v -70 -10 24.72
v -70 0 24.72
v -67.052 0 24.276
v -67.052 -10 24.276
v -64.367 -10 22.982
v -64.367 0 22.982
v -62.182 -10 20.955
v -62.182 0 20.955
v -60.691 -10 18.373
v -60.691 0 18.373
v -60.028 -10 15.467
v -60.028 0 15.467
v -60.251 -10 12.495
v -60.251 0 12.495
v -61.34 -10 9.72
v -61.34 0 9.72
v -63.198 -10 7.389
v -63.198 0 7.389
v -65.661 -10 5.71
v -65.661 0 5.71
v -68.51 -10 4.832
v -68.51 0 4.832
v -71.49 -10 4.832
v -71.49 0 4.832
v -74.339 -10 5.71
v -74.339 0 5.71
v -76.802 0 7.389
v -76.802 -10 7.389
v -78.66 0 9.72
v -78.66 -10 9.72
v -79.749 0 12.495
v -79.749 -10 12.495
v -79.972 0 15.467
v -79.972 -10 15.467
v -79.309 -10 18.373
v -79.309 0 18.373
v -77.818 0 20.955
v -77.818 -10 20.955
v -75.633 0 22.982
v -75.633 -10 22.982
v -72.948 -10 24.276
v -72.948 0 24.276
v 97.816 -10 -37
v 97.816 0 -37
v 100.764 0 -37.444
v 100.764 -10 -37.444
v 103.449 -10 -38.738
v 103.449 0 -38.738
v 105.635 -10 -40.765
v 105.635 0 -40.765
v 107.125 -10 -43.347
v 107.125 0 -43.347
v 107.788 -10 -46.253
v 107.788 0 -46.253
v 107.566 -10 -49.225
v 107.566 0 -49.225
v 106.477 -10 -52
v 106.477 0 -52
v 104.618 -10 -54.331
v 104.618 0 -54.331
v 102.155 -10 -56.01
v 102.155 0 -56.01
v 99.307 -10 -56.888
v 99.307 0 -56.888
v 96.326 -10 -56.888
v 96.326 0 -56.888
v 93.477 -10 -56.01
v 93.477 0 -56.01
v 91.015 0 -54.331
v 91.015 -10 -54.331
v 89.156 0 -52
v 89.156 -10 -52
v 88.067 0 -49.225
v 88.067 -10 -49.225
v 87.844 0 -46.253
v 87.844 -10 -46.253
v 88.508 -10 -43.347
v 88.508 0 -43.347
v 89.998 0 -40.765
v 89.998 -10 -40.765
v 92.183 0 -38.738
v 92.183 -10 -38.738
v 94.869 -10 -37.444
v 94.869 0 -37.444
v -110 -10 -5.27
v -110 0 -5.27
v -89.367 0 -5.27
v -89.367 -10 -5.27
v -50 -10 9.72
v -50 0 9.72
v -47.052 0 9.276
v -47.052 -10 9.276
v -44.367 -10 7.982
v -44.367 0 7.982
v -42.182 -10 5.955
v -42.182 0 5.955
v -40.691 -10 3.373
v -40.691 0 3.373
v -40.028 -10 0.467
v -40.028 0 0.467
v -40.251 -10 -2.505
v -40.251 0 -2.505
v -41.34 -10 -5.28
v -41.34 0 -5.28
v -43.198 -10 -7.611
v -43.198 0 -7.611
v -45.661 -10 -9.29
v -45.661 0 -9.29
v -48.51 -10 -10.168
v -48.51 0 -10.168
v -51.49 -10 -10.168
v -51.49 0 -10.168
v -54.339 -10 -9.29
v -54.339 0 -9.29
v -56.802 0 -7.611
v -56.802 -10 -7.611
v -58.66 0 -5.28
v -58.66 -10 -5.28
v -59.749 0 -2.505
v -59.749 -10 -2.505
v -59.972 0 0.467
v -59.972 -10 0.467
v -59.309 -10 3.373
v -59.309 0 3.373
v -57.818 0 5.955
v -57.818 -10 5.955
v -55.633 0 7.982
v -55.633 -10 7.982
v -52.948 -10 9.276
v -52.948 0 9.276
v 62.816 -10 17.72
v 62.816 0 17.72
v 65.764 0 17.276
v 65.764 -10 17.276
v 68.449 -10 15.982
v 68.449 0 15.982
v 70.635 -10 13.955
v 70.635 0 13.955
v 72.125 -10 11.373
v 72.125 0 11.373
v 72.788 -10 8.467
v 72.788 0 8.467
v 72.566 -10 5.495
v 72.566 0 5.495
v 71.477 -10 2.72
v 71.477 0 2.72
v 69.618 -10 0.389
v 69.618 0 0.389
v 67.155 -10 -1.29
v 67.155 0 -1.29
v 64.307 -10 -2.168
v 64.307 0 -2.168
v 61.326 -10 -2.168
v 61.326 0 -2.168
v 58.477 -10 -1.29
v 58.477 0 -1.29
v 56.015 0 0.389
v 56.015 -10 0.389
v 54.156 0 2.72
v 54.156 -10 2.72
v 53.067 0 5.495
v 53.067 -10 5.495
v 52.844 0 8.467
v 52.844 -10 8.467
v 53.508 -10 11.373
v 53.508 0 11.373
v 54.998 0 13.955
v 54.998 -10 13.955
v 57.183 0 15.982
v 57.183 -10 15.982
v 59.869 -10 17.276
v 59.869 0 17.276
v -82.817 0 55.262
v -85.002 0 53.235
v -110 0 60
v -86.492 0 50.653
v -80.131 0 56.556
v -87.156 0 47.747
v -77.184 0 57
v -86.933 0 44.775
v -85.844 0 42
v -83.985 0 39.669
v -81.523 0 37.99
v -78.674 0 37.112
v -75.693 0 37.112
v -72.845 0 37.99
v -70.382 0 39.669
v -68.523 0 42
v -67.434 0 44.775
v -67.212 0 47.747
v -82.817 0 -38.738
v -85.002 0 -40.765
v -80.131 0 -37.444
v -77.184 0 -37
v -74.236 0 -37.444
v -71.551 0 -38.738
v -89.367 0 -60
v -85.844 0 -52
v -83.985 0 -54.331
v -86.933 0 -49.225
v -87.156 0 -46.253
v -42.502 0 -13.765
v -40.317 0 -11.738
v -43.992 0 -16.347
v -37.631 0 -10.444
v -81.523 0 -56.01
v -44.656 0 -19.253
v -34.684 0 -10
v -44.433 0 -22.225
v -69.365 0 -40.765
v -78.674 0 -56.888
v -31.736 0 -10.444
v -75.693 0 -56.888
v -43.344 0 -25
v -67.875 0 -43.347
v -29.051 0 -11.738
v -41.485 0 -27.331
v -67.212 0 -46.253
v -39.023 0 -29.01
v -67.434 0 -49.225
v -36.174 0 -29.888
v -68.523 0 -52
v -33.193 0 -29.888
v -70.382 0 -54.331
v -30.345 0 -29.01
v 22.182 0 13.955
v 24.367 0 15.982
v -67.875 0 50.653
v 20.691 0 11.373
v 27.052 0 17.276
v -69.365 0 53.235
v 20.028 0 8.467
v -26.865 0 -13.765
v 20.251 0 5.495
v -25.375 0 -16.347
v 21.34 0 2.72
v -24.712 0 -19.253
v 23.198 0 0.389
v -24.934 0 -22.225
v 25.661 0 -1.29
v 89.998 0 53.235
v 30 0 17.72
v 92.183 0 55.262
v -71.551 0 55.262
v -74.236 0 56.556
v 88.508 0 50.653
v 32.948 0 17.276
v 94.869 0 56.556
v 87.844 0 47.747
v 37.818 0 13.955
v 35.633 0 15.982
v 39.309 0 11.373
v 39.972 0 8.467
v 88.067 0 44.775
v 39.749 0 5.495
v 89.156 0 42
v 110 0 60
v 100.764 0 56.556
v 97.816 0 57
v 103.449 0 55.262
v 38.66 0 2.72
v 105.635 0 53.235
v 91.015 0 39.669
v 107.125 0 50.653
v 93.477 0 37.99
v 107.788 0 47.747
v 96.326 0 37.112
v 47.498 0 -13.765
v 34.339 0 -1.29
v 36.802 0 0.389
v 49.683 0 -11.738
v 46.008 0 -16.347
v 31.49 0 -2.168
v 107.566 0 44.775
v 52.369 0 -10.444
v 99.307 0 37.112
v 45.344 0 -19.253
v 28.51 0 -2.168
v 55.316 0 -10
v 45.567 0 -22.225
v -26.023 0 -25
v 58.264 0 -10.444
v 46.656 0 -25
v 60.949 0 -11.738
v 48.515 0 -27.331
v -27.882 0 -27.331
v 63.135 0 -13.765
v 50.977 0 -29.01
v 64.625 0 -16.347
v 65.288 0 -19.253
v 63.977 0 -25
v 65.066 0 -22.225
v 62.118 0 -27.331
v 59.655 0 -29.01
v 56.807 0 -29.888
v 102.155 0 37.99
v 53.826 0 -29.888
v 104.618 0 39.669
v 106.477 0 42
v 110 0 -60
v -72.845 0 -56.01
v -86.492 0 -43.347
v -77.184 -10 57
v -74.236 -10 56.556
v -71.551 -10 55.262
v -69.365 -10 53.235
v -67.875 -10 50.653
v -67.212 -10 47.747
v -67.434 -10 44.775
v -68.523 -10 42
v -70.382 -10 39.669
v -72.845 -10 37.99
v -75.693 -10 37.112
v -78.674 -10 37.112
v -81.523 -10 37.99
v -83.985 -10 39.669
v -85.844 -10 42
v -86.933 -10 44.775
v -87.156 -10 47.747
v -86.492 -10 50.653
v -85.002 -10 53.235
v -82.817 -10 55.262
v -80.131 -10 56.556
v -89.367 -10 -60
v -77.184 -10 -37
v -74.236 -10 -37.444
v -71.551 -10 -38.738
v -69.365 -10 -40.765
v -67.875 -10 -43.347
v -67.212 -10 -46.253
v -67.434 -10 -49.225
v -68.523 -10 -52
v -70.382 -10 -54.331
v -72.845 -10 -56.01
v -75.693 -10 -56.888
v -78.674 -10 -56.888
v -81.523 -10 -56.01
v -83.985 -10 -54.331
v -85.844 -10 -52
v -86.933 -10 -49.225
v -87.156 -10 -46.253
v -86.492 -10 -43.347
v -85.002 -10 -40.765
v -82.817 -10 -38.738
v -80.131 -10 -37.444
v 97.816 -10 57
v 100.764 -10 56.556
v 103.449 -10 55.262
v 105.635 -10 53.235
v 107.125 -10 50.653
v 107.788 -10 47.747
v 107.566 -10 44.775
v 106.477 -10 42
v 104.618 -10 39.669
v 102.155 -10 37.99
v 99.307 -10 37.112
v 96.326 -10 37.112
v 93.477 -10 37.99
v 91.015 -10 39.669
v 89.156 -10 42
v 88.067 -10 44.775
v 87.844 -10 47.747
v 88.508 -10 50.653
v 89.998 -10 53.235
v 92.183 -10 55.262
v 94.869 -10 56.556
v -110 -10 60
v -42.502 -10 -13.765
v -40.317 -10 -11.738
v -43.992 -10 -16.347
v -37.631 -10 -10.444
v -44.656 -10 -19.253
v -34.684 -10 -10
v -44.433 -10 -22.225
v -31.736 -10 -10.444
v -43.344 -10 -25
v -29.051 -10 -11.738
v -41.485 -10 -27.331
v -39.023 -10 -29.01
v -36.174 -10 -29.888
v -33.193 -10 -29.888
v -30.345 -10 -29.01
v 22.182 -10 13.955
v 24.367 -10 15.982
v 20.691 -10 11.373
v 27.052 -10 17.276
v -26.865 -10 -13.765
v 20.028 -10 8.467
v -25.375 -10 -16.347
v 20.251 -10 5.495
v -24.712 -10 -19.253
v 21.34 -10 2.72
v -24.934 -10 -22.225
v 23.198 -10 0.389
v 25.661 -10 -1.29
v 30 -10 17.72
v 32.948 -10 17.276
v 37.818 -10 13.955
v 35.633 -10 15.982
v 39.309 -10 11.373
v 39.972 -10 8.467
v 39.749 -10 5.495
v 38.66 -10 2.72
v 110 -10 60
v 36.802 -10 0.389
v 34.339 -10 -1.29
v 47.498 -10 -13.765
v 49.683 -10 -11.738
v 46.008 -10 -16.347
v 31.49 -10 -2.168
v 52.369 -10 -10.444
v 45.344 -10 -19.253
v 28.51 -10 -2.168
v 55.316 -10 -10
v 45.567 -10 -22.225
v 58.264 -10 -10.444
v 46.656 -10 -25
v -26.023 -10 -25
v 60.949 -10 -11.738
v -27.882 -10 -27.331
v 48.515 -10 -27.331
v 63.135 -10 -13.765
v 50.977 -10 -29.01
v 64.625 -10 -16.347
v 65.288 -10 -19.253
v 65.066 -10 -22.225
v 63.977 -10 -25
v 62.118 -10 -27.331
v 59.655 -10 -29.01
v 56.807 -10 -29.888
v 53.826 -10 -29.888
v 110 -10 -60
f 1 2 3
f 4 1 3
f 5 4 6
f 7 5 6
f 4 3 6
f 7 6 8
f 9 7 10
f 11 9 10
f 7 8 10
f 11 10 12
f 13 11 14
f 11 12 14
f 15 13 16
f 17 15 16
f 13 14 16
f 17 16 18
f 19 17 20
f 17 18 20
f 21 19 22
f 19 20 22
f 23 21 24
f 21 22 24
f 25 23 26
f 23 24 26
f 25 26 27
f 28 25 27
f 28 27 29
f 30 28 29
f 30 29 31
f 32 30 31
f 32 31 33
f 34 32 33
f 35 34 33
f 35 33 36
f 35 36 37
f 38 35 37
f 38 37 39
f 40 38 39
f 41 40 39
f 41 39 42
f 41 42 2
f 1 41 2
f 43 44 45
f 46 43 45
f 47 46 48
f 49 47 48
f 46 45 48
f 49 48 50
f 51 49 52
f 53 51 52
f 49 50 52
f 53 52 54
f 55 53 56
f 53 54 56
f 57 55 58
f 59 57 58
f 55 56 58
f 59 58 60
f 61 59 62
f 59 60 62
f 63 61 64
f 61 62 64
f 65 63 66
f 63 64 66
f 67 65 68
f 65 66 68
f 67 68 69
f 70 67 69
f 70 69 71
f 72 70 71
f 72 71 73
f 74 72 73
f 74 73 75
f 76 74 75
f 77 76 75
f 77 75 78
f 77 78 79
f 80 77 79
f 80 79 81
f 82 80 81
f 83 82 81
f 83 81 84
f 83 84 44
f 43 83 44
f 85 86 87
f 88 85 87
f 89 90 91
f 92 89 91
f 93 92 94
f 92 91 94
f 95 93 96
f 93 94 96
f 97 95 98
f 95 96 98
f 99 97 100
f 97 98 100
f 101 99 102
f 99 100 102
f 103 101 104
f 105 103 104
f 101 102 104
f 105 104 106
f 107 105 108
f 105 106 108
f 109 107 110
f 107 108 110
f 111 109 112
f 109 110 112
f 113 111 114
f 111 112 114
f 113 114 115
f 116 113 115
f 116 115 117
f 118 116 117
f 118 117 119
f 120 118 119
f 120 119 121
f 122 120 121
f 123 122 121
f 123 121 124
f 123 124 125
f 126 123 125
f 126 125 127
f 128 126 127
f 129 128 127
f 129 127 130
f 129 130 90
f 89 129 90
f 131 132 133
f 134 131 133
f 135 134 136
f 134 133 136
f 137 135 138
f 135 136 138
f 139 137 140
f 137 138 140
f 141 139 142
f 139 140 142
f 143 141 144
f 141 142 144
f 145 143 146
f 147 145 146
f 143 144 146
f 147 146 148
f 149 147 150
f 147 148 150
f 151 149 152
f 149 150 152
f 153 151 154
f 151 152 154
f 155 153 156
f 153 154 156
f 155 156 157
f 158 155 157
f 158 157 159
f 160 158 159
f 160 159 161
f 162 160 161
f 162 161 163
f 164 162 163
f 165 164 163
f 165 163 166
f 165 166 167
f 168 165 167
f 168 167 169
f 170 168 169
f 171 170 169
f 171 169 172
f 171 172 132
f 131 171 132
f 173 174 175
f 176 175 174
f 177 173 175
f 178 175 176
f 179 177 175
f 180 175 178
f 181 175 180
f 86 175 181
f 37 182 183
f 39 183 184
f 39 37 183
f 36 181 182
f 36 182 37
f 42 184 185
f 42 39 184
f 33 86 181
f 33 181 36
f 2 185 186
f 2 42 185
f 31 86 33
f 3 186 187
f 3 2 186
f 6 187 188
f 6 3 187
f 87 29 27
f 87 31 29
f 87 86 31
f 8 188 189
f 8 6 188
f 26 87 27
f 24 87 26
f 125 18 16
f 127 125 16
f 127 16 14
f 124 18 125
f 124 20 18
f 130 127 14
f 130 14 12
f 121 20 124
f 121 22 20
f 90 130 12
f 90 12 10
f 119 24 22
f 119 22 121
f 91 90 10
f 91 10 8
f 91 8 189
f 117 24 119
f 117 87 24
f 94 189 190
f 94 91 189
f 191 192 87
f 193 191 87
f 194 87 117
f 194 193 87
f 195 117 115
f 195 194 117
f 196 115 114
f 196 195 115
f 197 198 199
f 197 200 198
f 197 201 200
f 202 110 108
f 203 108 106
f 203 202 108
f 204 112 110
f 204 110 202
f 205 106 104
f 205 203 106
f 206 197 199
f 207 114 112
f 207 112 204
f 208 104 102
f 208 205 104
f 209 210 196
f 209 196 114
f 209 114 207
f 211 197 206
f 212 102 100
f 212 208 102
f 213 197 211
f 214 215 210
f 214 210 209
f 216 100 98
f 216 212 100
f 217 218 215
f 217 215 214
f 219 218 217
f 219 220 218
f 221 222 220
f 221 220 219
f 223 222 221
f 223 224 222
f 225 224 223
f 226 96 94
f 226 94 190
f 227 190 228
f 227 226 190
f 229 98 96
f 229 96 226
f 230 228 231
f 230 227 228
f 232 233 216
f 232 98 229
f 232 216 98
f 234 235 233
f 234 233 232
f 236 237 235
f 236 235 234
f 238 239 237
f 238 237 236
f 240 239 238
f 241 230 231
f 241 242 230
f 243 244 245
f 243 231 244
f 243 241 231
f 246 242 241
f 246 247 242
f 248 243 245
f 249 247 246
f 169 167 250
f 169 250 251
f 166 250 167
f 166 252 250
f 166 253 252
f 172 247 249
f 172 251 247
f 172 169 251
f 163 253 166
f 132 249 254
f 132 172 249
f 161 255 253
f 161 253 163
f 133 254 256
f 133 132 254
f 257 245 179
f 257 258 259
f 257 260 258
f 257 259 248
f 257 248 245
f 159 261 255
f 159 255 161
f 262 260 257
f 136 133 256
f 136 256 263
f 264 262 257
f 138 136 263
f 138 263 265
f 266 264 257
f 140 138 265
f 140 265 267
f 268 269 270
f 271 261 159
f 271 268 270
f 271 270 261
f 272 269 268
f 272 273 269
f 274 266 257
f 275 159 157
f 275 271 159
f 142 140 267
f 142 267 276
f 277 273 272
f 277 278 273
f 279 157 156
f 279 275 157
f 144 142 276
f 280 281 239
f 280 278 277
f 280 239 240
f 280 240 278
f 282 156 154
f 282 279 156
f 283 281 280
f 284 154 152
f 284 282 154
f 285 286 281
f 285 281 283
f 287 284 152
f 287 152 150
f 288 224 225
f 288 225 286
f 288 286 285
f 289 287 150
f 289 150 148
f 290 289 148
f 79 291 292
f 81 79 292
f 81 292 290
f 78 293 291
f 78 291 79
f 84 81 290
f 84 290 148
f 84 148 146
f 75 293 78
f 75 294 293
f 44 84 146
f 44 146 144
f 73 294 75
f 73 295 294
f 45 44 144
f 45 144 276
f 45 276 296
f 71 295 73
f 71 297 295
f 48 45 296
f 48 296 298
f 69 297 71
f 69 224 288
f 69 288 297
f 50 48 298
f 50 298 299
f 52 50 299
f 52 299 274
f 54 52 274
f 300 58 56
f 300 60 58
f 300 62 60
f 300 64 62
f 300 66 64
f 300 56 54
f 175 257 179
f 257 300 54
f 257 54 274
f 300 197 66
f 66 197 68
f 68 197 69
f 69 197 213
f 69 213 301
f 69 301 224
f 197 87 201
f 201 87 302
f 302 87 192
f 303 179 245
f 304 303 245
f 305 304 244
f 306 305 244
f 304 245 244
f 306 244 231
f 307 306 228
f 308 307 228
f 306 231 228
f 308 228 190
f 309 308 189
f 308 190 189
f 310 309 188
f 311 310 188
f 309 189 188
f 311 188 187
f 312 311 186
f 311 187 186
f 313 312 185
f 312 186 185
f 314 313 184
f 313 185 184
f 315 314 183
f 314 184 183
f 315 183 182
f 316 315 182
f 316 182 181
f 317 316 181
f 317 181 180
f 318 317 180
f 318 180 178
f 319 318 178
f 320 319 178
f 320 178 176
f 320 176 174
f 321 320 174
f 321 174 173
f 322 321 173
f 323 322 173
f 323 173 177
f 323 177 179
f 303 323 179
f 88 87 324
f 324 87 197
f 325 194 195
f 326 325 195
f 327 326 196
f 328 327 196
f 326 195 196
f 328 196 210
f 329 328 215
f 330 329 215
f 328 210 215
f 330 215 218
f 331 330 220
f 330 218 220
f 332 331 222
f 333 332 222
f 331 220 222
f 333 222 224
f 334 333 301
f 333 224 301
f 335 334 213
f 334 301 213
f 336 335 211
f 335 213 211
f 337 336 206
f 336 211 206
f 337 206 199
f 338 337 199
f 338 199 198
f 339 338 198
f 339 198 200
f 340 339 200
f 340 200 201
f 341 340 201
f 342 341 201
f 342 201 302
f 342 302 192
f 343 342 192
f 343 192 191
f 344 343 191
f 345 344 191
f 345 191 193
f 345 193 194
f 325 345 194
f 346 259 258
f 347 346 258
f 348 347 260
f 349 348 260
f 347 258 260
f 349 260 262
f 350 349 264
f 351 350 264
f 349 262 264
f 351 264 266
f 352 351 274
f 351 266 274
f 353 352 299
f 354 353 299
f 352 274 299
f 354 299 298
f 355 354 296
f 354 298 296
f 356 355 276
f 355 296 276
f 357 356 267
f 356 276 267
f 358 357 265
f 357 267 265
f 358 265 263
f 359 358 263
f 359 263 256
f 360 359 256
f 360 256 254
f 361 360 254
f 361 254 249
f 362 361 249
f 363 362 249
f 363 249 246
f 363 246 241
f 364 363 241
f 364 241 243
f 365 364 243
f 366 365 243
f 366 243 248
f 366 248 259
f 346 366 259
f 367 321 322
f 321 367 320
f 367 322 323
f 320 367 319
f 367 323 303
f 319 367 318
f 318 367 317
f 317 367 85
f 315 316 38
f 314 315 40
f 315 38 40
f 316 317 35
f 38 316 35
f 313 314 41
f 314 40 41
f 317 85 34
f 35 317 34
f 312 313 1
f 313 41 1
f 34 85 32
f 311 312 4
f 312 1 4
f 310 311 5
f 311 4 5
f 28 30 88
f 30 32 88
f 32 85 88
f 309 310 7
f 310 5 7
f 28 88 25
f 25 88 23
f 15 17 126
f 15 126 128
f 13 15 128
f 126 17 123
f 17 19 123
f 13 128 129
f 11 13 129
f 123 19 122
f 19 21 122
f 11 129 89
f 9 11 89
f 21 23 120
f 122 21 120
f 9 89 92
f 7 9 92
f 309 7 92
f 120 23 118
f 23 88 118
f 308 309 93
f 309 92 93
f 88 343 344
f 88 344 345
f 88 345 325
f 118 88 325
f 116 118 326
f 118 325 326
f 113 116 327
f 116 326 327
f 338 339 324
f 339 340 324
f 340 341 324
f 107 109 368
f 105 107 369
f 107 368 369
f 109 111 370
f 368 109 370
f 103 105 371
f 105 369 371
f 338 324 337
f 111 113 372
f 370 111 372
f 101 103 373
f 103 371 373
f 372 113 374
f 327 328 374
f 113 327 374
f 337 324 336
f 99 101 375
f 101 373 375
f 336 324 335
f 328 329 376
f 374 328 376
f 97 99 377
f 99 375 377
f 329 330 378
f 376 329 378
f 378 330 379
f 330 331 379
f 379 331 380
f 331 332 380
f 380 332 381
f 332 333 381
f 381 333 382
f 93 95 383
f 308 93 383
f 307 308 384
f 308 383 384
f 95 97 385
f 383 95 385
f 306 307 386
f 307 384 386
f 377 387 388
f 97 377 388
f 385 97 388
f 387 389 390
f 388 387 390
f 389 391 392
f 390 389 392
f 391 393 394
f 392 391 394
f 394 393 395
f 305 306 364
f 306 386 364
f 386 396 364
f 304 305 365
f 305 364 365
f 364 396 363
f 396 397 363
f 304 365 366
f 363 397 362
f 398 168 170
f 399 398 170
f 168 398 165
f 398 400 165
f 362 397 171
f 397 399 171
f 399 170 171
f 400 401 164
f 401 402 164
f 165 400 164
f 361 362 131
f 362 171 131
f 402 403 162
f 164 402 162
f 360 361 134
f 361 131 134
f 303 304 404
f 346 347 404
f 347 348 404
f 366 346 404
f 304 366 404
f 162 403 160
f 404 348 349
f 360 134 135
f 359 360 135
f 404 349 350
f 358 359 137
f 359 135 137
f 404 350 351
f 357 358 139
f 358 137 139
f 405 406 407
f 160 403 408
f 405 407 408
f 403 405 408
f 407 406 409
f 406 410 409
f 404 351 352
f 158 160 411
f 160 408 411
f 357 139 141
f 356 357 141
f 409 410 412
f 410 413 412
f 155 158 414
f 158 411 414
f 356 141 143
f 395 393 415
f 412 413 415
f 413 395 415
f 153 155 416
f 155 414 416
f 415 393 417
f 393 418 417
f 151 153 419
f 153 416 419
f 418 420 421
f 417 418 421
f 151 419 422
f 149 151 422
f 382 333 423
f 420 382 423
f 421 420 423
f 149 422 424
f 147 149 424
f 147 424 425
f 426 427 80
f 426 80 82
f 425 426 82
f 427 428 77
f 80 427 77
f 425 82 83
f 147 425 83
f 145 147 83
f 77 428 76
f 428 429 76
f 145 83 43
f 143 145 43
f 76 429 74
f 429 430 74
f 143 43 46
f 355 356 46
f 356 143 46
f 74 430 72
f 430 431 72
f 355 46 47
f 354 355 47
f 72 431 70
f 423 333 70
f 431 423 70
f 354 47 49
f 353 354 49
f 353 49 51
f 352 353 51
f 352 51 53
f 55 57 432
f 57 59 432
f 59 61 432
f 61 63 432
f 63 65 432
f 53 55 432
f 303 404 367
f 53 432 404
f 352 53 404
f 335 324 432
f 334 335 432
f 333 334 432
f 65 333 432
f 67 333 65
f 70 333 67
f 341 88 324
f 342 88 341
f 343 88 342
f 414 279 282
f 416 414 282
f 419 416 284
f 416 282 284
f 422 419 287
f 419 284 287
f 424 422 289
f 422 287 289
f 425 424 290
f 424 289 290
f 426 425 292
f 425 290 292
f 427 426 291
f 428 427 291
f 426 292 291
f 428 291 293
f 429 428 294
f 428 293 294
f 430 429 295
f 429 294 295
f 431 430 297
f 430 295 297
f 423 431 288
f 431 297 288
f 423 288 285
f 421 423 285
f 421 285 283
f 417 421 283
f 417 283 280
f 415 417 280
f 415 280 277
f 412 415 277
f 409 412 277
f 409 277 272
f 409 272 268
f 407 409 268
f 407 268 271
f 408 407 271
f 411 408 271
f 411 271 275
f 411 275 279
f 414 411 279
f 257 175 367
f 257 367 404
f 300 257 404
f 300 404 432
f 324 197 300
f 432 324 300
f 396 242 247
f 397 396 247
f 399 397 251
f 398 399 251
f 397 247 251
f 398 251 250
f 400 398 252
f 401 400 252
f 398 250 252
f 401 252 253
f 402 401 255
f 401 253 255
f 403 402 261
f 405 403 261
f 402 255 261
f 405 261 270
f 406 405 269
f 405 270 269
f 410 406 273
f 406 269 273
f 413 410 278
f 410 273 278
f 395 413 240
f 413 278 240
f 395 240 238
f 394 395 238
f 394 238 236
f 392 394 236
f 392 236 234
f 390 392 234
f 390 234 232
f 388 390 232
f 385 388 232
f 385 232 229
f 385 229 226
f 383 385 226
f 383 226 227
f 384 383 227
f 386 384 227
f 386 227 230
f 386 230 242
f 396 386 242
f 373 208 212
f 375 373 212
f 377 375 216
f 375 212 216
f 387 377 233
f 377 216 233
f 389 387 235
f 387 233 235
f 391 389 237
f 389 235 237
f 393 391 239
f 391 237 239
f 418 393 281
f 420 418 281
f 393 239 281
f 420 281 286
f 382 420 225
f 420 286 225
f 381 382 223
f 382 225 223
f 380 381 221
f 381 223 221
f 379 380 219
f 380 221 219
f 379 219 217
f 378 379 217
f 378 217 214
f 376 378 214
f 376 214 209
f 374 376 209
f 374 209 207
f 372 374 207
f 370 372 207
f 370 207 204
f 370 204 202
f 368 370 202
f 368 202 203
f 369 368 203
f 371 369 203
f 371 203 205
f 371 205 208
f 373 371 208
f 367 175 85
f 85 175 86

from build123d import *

# Parameters (mm, degrees)
SKETCH1_W           = 220
SKETCH1_H           = 120
BOSS_EXTRUDE1_DEPTH = 10
CUT_EXTRUDE1_REACH  = 127.698
SKETCH2_W           = 20.632503002
SKETCH2_H           = 54.730004003
CUT_EXTRUDE2_REACH  = 127.698
SKETCH3_R           = 10


with BuildPart() as part:
    # Sketch1 → Boss-Extrude1 (new body)
    with BuildSketch(Plane(origin=(0, 0, 0), x_dir=(1, 0, 0), z_dir=(0, 1, 0))):
        Rectangle(SKETCH1_W, SKETCH1_H)
    extrude(amount=-BOSS_EXTRUDE1_DEPTH)

    # Sketch2 → Cut-Extrude1 (cut, up to next)
    with BuildSketch(Plane(origin=(0, 0, 0), x_dir=(1, 0, 0), z_dir=(0, 1, 0)), mode=Mode.PRIVATE) as cut_extrude1_sk1:
        with Locations((-99.683748499, 32.634997999)):
            Rectangle(SKETCH2_W, SKETCH2_H)
    cut_extrude1_tool1 = extrude(cut_extrude1_sk1.sketch, amount=-CUT_EXTRUDE1_REACH, mode=Mode.PRIVATE) & part.part
    add(cut_extrude1_tool1.solids().sort_by_distance((-99.683748, 0, -32.634998))[0], mode=Mode.SUBTRACT)

    # Sketch3 → Cut-Extrude2 (cut, up to next)
    with BuildSketch(Plane(origin=(0, 0, 0), x_dir=(1, 0, 0), z_dir=(0, 1, 0)), mode=Mode.PRIVATE) as cut_extrude2_sk1:
        with Locations(Location((97.816251501, -47, 0), (0, 0, 270))):
            Circle(SKETCH3_R)
    cut_extrude2_tool1 = extrude(cut_extrude2_sk1.sketch, amount=-CUT_EXTRUDE2_REACH, mode=Mode.PRIVATE) & part.part
    # Sketch3 → Cut-Extrude2 (cut, up to next)
    with BuildSketch(Plane(origin=(0, 0, 0), x_dir=(1, 0, 0), z_dir=(0, 1, 0)), mode=Mode.PRIVATE) as cut_extrude2_sk2:
        with Locations(Location((-77.183748499, -47, 0), (0, 0, 270))):
            Circle(SKETCH3_R)
    cut_extrude2_tool2 = extrude(cut_extrude2_sk2.sketch, amount=-CUT_EXTRUDE2_REACH, mode=Mode.PRIVATE) & part.part
    # Sketch3 → Cut-Extrude2 (cut, up to next)
    with BuildSketch(Plane(origin=(0, 0, 0), x_dir=(1, 0, 0), z_dir=(0, 1, 0)), mode=Mode.PRIVATE) as cut_extrude2_sk3:
        with Locations(Location((-70, -14.72, 0), (0, 0, 270))):
            Circle(SKETCH3_R)
    cut_extrude2_tool3 = extrude(cut_extrude2_sk3.sketch, amount=-CUT_EXTRUDE2_REACH, mode=Mode.PRIVATE) & part.part
    # Sketch3 → Cut-Extrude2 (cut, up to next)
    with BuildSketch(Plane(origin=(0, 0, 0), x_dir=(1, 0, 0), z_dir=(0, 1, 0)), mode=Mode.PRIVATE) as cut_extrude2_sk4:
        with Locations(Location((-50, 0.28, 0), (0, 0, 270))):
            Circle(SKETCH3_R)
    cut_extrude2_tool4 = extrude(cut_extrude2_sk4.sketch, amount=-CUT_EXTRUDE2_REACH, mode=Mode.PRIVATE) & part.part
    # Sketch3 → Cut-Extrude2 (cut, up to next)
    with BuildSketch(Plane(origin=(0, 0, 0), x_dir=(1, 0, 0), z_dir=(0, 1, 0)), mode=Mode.PRIVATE) as cut_extrude2_sk5:
        with Locations(Location((30, -7.72, 0), (0, 0, 270))):
            Circle(SKETCH3_R)
    cut_extrude2_tool5 = extrude(cut_extrude2_sk5.sketch, amount=-CUT_EXTRUDE2_REACH, mode=Mode.PRIVATE) & part.part
    # Sketch3 → Cut-Extrude2 (cut, up to next)
    with BuildSketch(Plane(origin=(0, 0, 0), x_dir=(1, 0, 0), z_dir=(0, 1, 0)), mode=Mode.PRIVATE) as cut_extrude2_sk6:
        with Locations(Location((62.816251501, -7.72, 0), (0, 0, 270))):
            Circle(SKETCH3_R)
    cut_extrude2_tool6 = extrude(cut_extrude2_sk6.sketch, amount=-CUT_EXTRUDE2_REACH, mode=Mode.PRIVATE) & part.part
    # Sketch3 → Cut-Extrude2 (cut, up to next)
    with BuildSketch(Plane(origin=(0, 0, 0), x_dir=(1, 0, 0), z_dir=(0, 1, 0)), mode=Mode.PRIVATE) as cut_extrude2_sk7:
        with Locations(Location((55.316251501, 20, 0), (0, 0, 270))):
            Circle(SKETCH3_R)
    cut_extrude2_tool7 = extrude(cut_extrude2_sk7.sketch, amount=-CUT_EXTRUDE2_REACH, mode=Mode.PRIVATE) & part.part
    # Sketch3 → Cut-Extrude2 (cut, up to next)
    with BuildSketch(Plane(origin=(0, 0, 0), x_dir=(1, 0, 0), z_dir=(0, 1, 0)), mode=Mode.PRIVATE) as cut_extrude2_sk8:
        with Locations(Location((97.816251501, 47, 0), (0, 0, 270))):
            Circle(SKETCH3_R)
    cut_extrude2_tool8 = extrude(cut_extrude2_sk8.sketch, amount=-CUT_EXTRUDE2_REACH, mode=Mode.PRIVATE) & part.part
    # Sketch3 → Cut-Extrude2 (cut, up to next)
    with BuildSketch(Plane(origin=(0, 0, 0), x_dir=(1, 0, 0), z_dir=(0, 1, 0)), mode=Mode.PRIVATE) as cut_extrude2_sk9:
        with Locations(Location((-34.683748499, 20, 0), (0, 0, 270))):
            Circle(SKETCH3_R)
    cut_extrude2_tool9 = extrude(cut_extrude2_sk9.sketch, amount=-CUT_EXTRUDE2_REACH, mode=Mode.PRIVATE) & part.part
    # Sketch3 → Cut-Extrude2 (cut, up to next)
    with BuildSketch(Plane(origin=(0, 0, 0), x_dir=(1, 0, 0), z_dir=(0, 1, 0)), mode=Mode.PRIVATE) as cut_extrude2_sk10:
        with Locations(Location((-77.183748499, 47, 0), (0, 0, 270))):
            Circle(SKETCH3_R)
    cut_extrude2_tool10 = extrude(cut_extrude2_sk10.sketch, amount=-CUT_EXTRUDE2_REACH, mode=Mode.PRIVATE) & part.part
    add(cut_extrude2_tool1.solids().sort_by_distance((97.816252, 0, 47))[0], mode=Mode.SUBTRACT)
    add(cut_extrude2_tool2.solids().sort_by_distance((-77.183748, 0, 47))[0], mode=Mode.SUBTRACT)
    add(cut_extrude2_tool3.solids().sort_by_distance((-70, 0, 14.72))[0], mode=Mode.SUBTRACT)
    add(cut_extrude2_tool4.solids().sort_by_distance((-50, 0, -0.28))[0], mode=Mode.SUBTRACT)
    add(cut_extrude2_tool5.solids().sort_by_distance((30, 0, 7.72))[0], mode=Mode.SUBTRACT)
    add(cut_extrude2_tool6.solids().sort_by_distance((62.816252, 0, 7.72))[0], mode=Mode.SUBTRACT)
    add(cut_extrude2_tool7.solids().sort_by_distance((55.316252, 0, -20))[0], mode=Mode.SUBTRACT)
    add(cut_extrude2_tool8.solids().sort_by_distance((97.816252, 0, -47))[0], mode=Mode.SUBTRACT)
    add(cut_extrude2_tool9.solids().sort_by_distance((-34.683748, 0, -20))[0], mode=Mode.SUBTRACT)
    add(cut_extrude2_tool10.solids().sort_by_distance((-77.183748, 0, -47))[0], mode=Mode.SUBTRACT)


solid = part.part
